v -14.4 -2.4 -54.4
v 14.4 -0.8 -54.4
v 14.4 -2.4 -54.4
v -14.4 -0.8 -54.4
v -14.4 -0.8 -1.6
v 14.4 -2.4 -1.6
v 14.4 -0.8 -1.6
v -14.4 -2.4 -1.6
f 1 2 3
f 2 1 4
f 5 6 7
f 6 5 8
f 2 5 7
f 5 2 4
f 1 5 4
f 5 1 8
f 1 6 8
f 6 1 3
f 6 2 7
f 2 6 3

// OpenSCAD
// file: ../p/4-4edge.scad
use <../lib.scad>
$fa=1; $fs=0.2;
function ldraw_lib__4_4edge(realsolid=false) = [
// 0 Circle 1.0
// 0 Name: 4-4edge.dat
// 0 Author: James Jessiman
// 0 !LDRAW_ORG Primitive UPDATE 2017-01
// 0 !LICENSE Licensed under CC BY 2.0 and CC BY 4.0 : see CAreadme.txt
// 
// 0 BFC CERTIFY CCW
  [0,"BFC","CERTIFY"],
  [0,"BFC","CCW"],
// 
// 0 !HISTORY 1998-12-15 [PTadmin] Official Update 1998-10
// 0 !HISTORY 2005-12-28 [PTadmin] Official Update 2005-01
// 0 !HISTORY 2007-06-24 [PTadmin] Header formatted for Contributor Agreement
// 0 !HISTORY 2008-07-01 [PTadmin] Official Update 2008-01
// 0 !HISTORY 2017-01-15 [Steffen] BFCed
// 0 !HISTORY 2017-12-30 [PTadmin] Official Update 2017-01
// 
// 
// 2 24 1 0 0 0.9239 0 0.3827
  [2,24,1,0,0,0.9239,0,0.3827],
// 2 24 0.9239 0 0.3827 0.7071 0 0.7071
  [2,24,0.9239,0,0.3827,0.7071,0,0.7071],
// 2 24 0.7071 0 0.7071 0.3827 0 0.9239
  [2,24,0.7071,0,0.7071,0.3827,0,0.9239],
// 2 24 0.3827 0 0.9239 0 0 1
  [2,24,0.3827,0,0.9239,0,0,1],
// 2 24 0 0 1 -0.3827 0 0.9239
  [2,24,0,0,1,-0.3827,0,0.9239],
// 2 24 -0.3827 0 0.9239 -0.7071 0 0.7071
  [2,24,-0.3827,0,0.9239,-0.7071,0,0.7071],
// 2 24 -0.7071 0 0.7071 -0.9239 0 0.3827
  [2,24,-0.7071,0,0.7071,-0.9239,0,0.3827],
// 2 24 -0.9239 0 0.3827 -1 0 -0
  [2,24,-0.9239,0,0.3827,-1,0,-0],
// 2 24 -1 0 -0 -0.9239 0 -0.3827
  [2,24,-1,0,-0,-0.9239,0,-0.3827],
// 2 24 -0.9239 0 -0.3827 -0.7071 0 -0.7071
  [2,24,-0.9239,0,-0.3827,-0.7071,0,-0.7071],
// 2 24 -0.7071 0 -0.7071 -0.3827 0 -0.9239
  [2,24,-0.7071,0,-0.7071,-0.3827,0,-0.9239],
// 2 24 -0.3827 0 -0.9239 0 0 -1
  [2,24,-0.3827,0,-0.9239,0,0,-1],
// 2 24 0 0 -1 0.3827 0 -0.9239
  [2,24,0,0,-1,0.3827,0,-0.9239],
// 2 24 0.3827 0 -0.9239 0.7071 0 -0.7071
  [2,24,0.3827,0,-0.9239,0.7071,0,-0.7071],
// 2 24 0.7071 0 -0.7071 0.9239 0 -0.3827
  [2,24,0.7071,0,-0.7071,0.9239,0,-0.3827],
// 2 24 0.9239 0 -0.3827 1 0 0
  [2,24,0.9239,0,-0.3827,1,0,0],
];
module ldraw_lib__4_4edge(step=0, col=false, unit=2/5, alt=false, line=0.2, solid=!$preview)
    makepoly(ldraw_lib__4_4edge(solid), step=step, col=col, unit=unit, alt=alt, line=line, solid=solid);
ldraw_lib__4_4edge(line=0.2);
// file: ../p/4-4disc.scad
use <../lib.scad>
$fa=1; $fs=0.2;
function ldraw_lib__4_4disc(realsolid=false) = [
// 0 Disc 1.0
// 0 Name: 4-4disc.dat
// 0 Author: James Jessiman
// 0 !LDRAW_ORG Primitive UPDATE 2002-02
// 0 !LICENSE Licensed under CC BY 2.0 and CC BY 4.0 : see CAreadme.txt
// 
// 0 BFC CERTIFY CCW
  [0,"BFC","CERTIFY"],
  [0,"BFC","CCW"],
// 
// 0 !HISTORY 1998-12-15 [PTadmin] Official Update 1998-10
// 0 !HISTORY 2002-03-23 [sbliss] Added BFC statement
// 0 !HISTORY 2002-04-25 [PTadmin] Official Update 2002-02
// 0 !HISTORY 2007-06-24 [PTadmin] Header formatted for Contributor Agreement
// 0 !HISTORY 2008-07-01 [PTadmin] Official Update 2008-01
// 
// 
// 3 16 0 0 0 1 0 0 0.9239 0 0.3827
  [3,16,0,0,0,1,0,0,0.9239,0,0.3827],
// 3 16 0 0 0 0.9239 0 0.3827 0.7071 0 0.7071
  [3,16,0,0,0,0.9239,0,0.3827,0.7071,0,0.7071],
// 3 16 0 0 0 0.7071 0 0.7071 0.3827 0 0.9239
  [3,16,0,0,0,0.7071,0,0.7071,0.3827,0,0.9239],
// 3 16 0 0 0 0.3827 0 0.9239 0 0 1
  [3,16,0,0,0,0.3827,0,0.9239,0,0,1],
// 3 16 0 0 0 0 0 1 -0.3827 0 0.9239
  [3,16,0,0,0,0,0,1,-0.3827,0,0.9239],
// 3 16 0 0 0 -0.3827 0 0.9239 -0.7071 0 0.7071
  [3,16,0,0,0,-0.3827,0,0.9239,-0.7071,0,0.7071],
// 3 16 0 0 0 -0.7071 0 0.7071 -0.9239 0 0.3827
  [3,16,0,0,0,-0.7071,0,0.7071,-0.9239,0,0.3827],
// 3 16 0 0 0 -0.9239 0 0.3827 -1 0 -0
  [3,16,0,0,0,-0.9239,0,0.3827,-1,0,-0],
// 3 16 0 0 0 -1 0 -0 -0.9239 0 -0.3827
  [3,16,0,0,0,-1,0,-0,-0.9239,0,-0.3827],
// 3 16 0 0 0 -0.9239 0 -0.3827 -0.7071 0 -0.7071
  [3,16,0,0,0,-0.9239,0,-0.3827,-0.7071,0,-0.7071],
// 3 16 0 0 0 -0.7071 0 -0.7071 -0.3827 0 -0.9239
  [3,16,0,0,0,-0.7071,0,-0.7071,-0.3827,0,-0.9239],
// 3 16 0 0 0 -0.3827 0 -0.9239 0 0 -1
  [3,16,0,0,0,-0.3827,0,-0.9239,0,0,-1],
// 3 16 0 0 0 0 0 -1 0.3827 0 -0.9239
  [3,16,0,0,0,0,0,-1,0.3827,0,-0.9239],
// 3 16 0 0 0 0.3827 0 -0.9239 0.7071 0 -0.7071
  [3,16,0,0,0,0.3827,0,-0.9239,0.7071,0,-0.7071],
// 3 16 0 0 0 0.7071 0 -0.7071 0.9239 0 -0.3827
  [3,16,0,0,0,0.7071,0,-0.7071,0.9239,0,-0.3827],
// 3 16 0 0 0 0.9239 0 -0.3827 1 0 0
  [3,16,0,0,0,0.9239,0,-0.3827,1,0,0],
// 0
];
module ldraw_lib__4_4disc(step=0, col=false, unit=2/5, alt=false, line=0.2, solid=!$preview)
    makepoly(ldraw_lib__4_4disc(solid), step=step, col=col, unit=unit, alt=alt, line=line, solid=solid);
ldraw_lib__4_4disc(line=0.2);
// file: ../p/4-4cyli.scad
use <../lib.scad>
$fa=1; $fs=0.2;
function ldraw_lib__4_4cyli(realsolid=false) = [
// 0 Cylinder 1.0
// 0 Name: 4-4cyli.dat
// 0 Author: James Jessiman
// 0 !LDRAW_ORG Primitive UPDATE 2005-01
// 0 !LICENSE Licensed under CC BY 2.0 and CC BY 4.0 : see CAreadme.txt
// 
// 0 BFC CERTIFY CCW
  [0,"BFC","CERTIFY"],
  [0,"BFC","CCW"],
// 
// 0 !HISTORY 1998-12-15 [PTadmin] Official Update 1998-10
// 0 !HISTORY 2002-03-23 [sbliss] Added BFC statement; merged headers from files in distributions LDraw 0.27 and Complete.
// 0 !HISTORY 2002-04-25 [PTadmin] Official Update 2002-02
// 0 !HISTORY 2004-12-14 [guyvivan] BFC CCW
// 0 !HISTORY 2005-12-28 [PTadmin] Official Update 2005-01
// 0 !HISTORY 2007-06-24 [PTadmin] Header formatted for Contributor Agreement
// 0 !HISTORY 2008-07-01 [PTadmin] Official Update 2008-01
// 
// 
// 4 16 1 1 0 0.9239 1 0.3827 0.9239 0 0.3827 1 0 0
  [4,16,1,1,0,0.9239,1,0.3827,0.9239,0,0.3827,1,0,0],
// 5 24 1 0 0 1 1 0 0.9239 0 0.3827 0.9239 0 -0.3827
  [5,24,1,0,0,1,1,0,0.9239,0,0.3827,0.9239,0,-0.3827],
// 4 16 0.9239 1 0.3827 0.7071 1 0.7071 0.7071 0 0.7071 0.9239 0 0.3827
  [4,16,0.9239,1,0.3827,0.7071,1,0.7071,0.7071,0,0.7071,0.9239,0,0.3827],
// 5 24 0.9239 0 0.3827 0.9239 1 0.3827 0.7071 0 0.7071 1 0 0
  [5,24,0.9239,0,0.3827,0.9239,1,0.3827,0.7071,0,0.7071,1,0,0],
// 4 16 0.7071 1 0.7071 0.3827 1 0.9239 0.3827 0 0.9239 0.7071 0 0.7071
  [4,16,0.7071,1,0.7071,0.3827,1,0.9239,0.3827,0,0.9239,0.7071,0,0.7071],
// 5 24 0.7071 0 0.7071 0.7071 1 0.7071 0.3827 0 0.9239 0.9239 0 0.3827
  [5,24,0.7071,0,0.7071,0.7071,1,0.7071,0.3827,0,0.9239,0.9239,0,0.3827],
// 4 16 0.3827 1 0.9239 0 1 1 0 0 1 0.3827 0 0.9239
  [4,16,0.3827,1,0.9239,0,1,1,0,0,1,0.3827,0,0.9239],
// 5 24 0.3827 0 0.9239 0.3827 1 0.9239 0 0 1 0.7071 0 0.7071
  [5,24,0.3827,0,0.9239,0.3827,1,0.9239,0,0,1,0.7071,0,0.7071],
// 4 16 0 1 1 -0.3827 1 0.9239 -0.3827 0 0.9239 0 0 1
  [4,16,0,1,1,-0.3827,1,0.9239,-0.3827,0,0.9239,0,0,1],
// 5 24 0 0 1 0 1 1 -0.3827 0 0.9239 0.3827 0 0.9239
  [5,24,0,0,1,0,1,1,-0.3827,0,0.9239,0.3827,0,0.9239],
// 4 16 -0.3827 1 0.9239 -0.7071 1 0.7071 -0.7071 0 0.7071 -0.3827 0 0.9239
  [4,16,-0.3827,1,0.9239,-0.7071,1,0.7071,-0.7071,0,0.7071,-0.3827,0,0.9239],
// 5 24 -0.3827 0 0.9239 -0.3827 1 0.9239 -0.7071 0 0.7071 0 0 1
  [5,24,-0.3827,0,0.9239,-0.3827,1,0.9239,-0.7071,0,0.7071,0,0,1],
// 4 16 -0.7071 1 0.7071 -0.9239 1 0.3827 -0.9239 0 0.3827 -0.7071 0 0.7071
  [4,16,-0.7071,1,0.7071,-0.9239,1,0.3827,-0.9239,0,0.3827,-0.7071,0,0.7071],
// 5 24 -0.7071 0 0.7071 -0.7071 1 0.7071 -0.9239 0 0.3827 -0.3827 0 0.9239
  [5,24,-0.7071,0,0.7071,-0.7071,1,0.7071,-0.9239,0,0.3827,-0.3827,0,0.9239],
// 4 16 -0.9239 1 0.3827 -1 1 0 -1 0 0 -0.9239 0 0.3827
  [4,16,-0.9239,1,0.3827,-1,1,0,-1,0,0,-0.9239,0,0.3827],
// 5 24 -0.9239 0 0.3827 -0.9239 1 0.3827 -1 0 0 -0.7071 0 0.7071
  [5,24,-0.9239,0,0.3827,-0.9239,1,0.3827,-1,0,0,-0.7071,0,0.7071],
// 4 16 -1 1 0 -0.9239 1 -0.3827 -0.9239 0 -0.3827 -1 0 0
  [4,16,-1,1,0,-0.9239,1,-0.3827,-0.9239,0,-0.3827,-1,0,0],
// 5 24 -1 0 0 -1 1 0 -0.9239 0 -0.3827 -0.9239 0 0.3827
  [5,24,-1,0,0,-1,1,0,-0.9239,0,-0.3827,-0.9239,0,0.3827],
// 4 16 -0.9239 1 -0.3827 -0.7071 1 -0.7071 -0.7071 0 -0.7071 -0.9239 0 -0.3827
  [4,16,-0.9239,1,-0.3827,-0.7071,1,-0.7071,-0.7071,0,-0.7071,-0.9239,0,-0.3827],
// 5 24 -0.9239 0 -0.3827 -0.9239 1 -0.3827 -0.7071 0 -0.7071 -1 0 0
  [5,24,-0.9239,0,-0.3827,-0.9239,1,-0.3827,-0.7071,0,-0.7071,-1,0,0],
// 4 16 -0.7071 1 -0.7071 -0.3827 1 -0.9239 -0.3827 0 -0.9239 -0.7071 0 -0.7071
  [4,16,-0.7071,1,-0.7071,-0.3827,1,-0.9239,-0.3827,0,-0.9239,-0.7071,0,-0.7071],
// 5 24 -0.7071 0 -0.7071 -0.7071 1 -0.7071 -0.3827 0 -0.9239 -0.9239 0 -0.3827
  [5,24,-0.7071,0,-0.7071,-0.7071,1,-0.7071,-0.3827,0,-0.9239,-0.9239,0,-0.3827],
// 4 16 -0.3827 1 -0.9239 0 1 -1 0 0 -1 -0.3827 0 -0.9239
  [4,16,-0.3827,1,-0.9239,0,1,-1,0,0,-1,-0.3827,0,-0.9239],
// 5 24 -0.3827 0 -0.9239 -0.3827 1 -0.9239 0 0 -1 -0.7071 0 -0.7071
  [5,24,-0.3827,0,-0.9239,-0.3827,1,-0.9239,0,0,-1,-0.7071,0,-0.7071],
// 4 16 0 1 -1 0.3827 1 -0.9239 0.3827 0 -0.9239 0 0 -1
  [4,16,0,1,-1,0.3827,1,-0.9239,0.3827,0,-0.9239,0,0,-1],
// 5 24 0 0 -1 0 1 -1 0.3827 0 -0.9239 -0.3827 0 -0.9239
  [5,24,0,0,-1,0,1,-1,0.3827,0,-0.9239,-0.3827,0,-0.9239],
// 4 16 0.3827 1 -0.9239 0.7071 1 -0.7071 0.7071 0 -0.7071 0.3827 0 -0.9239
  [4,16,0.3827,1,-0.9239,0.7071,1,-0.7071,0.7071,0,-0.7071,0.3827,0,-0.9239],
// 5 24 0.3827 0 -0.9239 0.3827 1 -0.9239 0.7071 0 -0.7071 0 0 -1
  [5,24,0.3827,0,-0.9239,0.3827,1,-0.9239,0.7071,0,-0.7071,0,0,-1],
// 4 16 0.7071 1 -0.7071 0.9239 1 -0.3827 0.9239 0 -0.3827 0.7071 0 -0.7071
  [4,16,0.7071,1,-0.7071,0.9239,1,-0.3827,0.9239,0,-0.3827,0.7071,0,-0.7071],
// 5 24 0.7071 0 -0.7071 0.7071 1 -0.7071 0.9239 0 -0.3827 0.3827 0 -0.9239
  [5,24,0.7071,0,-0.7071,0.7071,1,-0.7071,0.9239,0,-0.3827,0.3827,0,-0.9239],
// 4 16 0.9239 1 -0.3827 1 1 0 1 0 0 0.9239 0 -0.3827
  [4,16,0.9239,1,-0.3827,1,1,0,1,0,0,0.9239,0,-0.3827],
// 5 24 0.9239 0 -0.3827 0.9239 1 -0.3827 1 0 0 0.7071 0 -0.7071
  [5,24,0.9239,0,-0.3827,0.9239,1,-0.3827,1,0,0,0.7071,0,-0.7071],
// 0
];
module ldraw_lib__4_4cyli(step=0, col=false, unit=2/5, alt=false, line=0.2, solid=!$preview)
    makepoly(ldraw_lib__4_4cyli(solid), step=step, col=col, unit=unit, alt=alt, line=line, solid=solid);
ldraw_lib__4_4cyli(line=0.2);
// file: ../p/stud3.scad
use <../lib.scad>
use <4-4cyli.scad>
use <4-4disc.scad>
use <4-4edge.scad>
$fa=1; $fs=0.2;
function ldraw_lib__stud3(realsolid=false) = realsolid ? 
    [openscad(translate([0,0,-eps()], o=cylinder(4+eps(), r=4)),2)] : [
// 0 Stud Tube Solid
// 0 Name: stud3.dat
// 0 Author: James Jessiman
// 0 !LDRAW_ORG Primitive UPDATE 2012-01
// 0 !LICENSE Licensed under CC BY 2.0 and CC BY 4.0 : see CAreadme.txt
// 
// 0 BFC CERTIFY CCW
  [0,"BFC","CERTIFY"],
  [0,"BFC","CCW"],
// 
// 0 !HISTORY 2002-04-04 [sbliss] Modified for BFC compliance
// 0 !HISTORY 2002-04-25 [PTadmin] Official Update 2002-02
// 0 !HISTORY 2007-06-24 [PTadmin] Header formatted for Contributor Agreement
// 0 !HISTORY 2008-07-01 [PTadmin] Official Update 2008-01
// 0 !HISTORY 2012-02-16 [Philo] Changed to CCW
// 0 !HISTORY 2012-03-30 [PTadmin] Official Update 2012-01
// 
// 
// 1 16 0 -4 0 4 0 0 0 1 0 0 0 4 4-4edge.dat
  [1,16,0,-4,0,4,0,0,0,1,0,0,0,4, ldraw_lib__4_4edge(realsolid)],
// 1 16 0 0 0 4 0 0 0 1 0 0 0 4 4-4edge.dat
  [1,16,0,0,0,4,0,0,0,1,0,0,0,4, ldraw_lib__4_4edge(realsolid)],
// 1 16 0 -4 0 4 0 0 0 1 0 0 0 4 4-4disc.dat
  [1,16,0,-4,0,4,0,0,0,1,0,0,0,4, ldraw_lib__4_4disc(realsolid)],
// 1 16 0 -4 0 4 0 0 0 4 0 0 0 4 4-4cyli.dat
  [1,16,0,-4,0,4,0,0,0,4,0,0,0,4, ldraw_lib__4_4cyli(realsolid)],
];
module ldraw_lib__stud3(step=0, col=false, unit=2/5, alt=false, line=0.2, solid=!$preview)
    makepoly(ldraw_lib__stud3(solid), step=step, col=col, unit=unit, alt=alt, line=line, solid=solid);
ldraw_lib__stud3(line=0.2);
// file: ../p/stud.scad
use <../lib.scad>
use <4-4cyli.scad>
use <4-4disc.scad>
use <4-4edge.scad>
$fa=1; $fs=0.2;
function ldraw_lib__stud(realsolid=false) = realsolid ? 
    [openscad(translate([0,0,-eps()], o=cylinder(4+eps(), r=6)),2)] : [
// 0 Stud
// 0 Name: stud.dat
// 0 Author: James Jessiman
// 0 !LDRAW_ORG Primitive UPDATE 2012-01
// 0 !LICENSE Licensed under CC BY 2.0 and CC BY 4.0 : see CAreadme.txt
// 
// 0 BFC CERTIFY CCW
  [0,"BFC","CERTIFY"],
  [0,"BFC","CCW"],
// 
// 0 !HISTORY 2002-04-04 [sbliss] Modified for BFC compliance
// 0 !HISTORY 2002-04-25 [PTadmin] Official Update 2002-02
// 0 !HISTORY 2007-06-24 [PTadmin] Header formatted for Contributor Agreement
// 0 !HISTORY 2008-07-01 [PTadmin] Official Update 2008-01
// 0 !HISTORY 2012-02-16 [Philo] Changed to CCW
// 0 !HISTORY 2012-03-30 [PTadmin] Official Update 2012-01
// 
// 
// 1 16 0 0 0 6 0 0 0 1 0 0 0 6 4-4edge.dat
  [1,16,0,0,0,6,0,0,0,1,0,0,0,6, ldraw_lib__4_4edge(realsolid)],
// 1 16 0 -4 0 6 0 0 0 1 0 0 0 6 4-4edge.dat
  [1,16,0,-4,0,6,0,0,0,1,0,0,0,6, ldraw_lib__4_4edge(realsolid)],
// 1 16 0 0 0 6 0 0 0 -4 0 0 0 6 4-4cyli.dat
  [1,16,0,0,0,6,0,0,0,-4,0,0,0,6, ldraw_lib__4_4cyli(realsolid)],
// 1 16 0 -4 0 6 0 0 0 1 0 0 0 6 4-4disc.dat
  [1,16,0,-4,0,6,0,0,0,1,0,0,0,6, ldraw_lib__4_4disc(realsolid)],
];
module ldraw_lib__stud(step=0, col=false, unit=2/5, alt=false, line=0.2, solid=!$preview)
    makepoly(ldraw_lib__stud(solid), step=step, col=col, unit=unit, alt=alt, line=line, solid=solid);
ldraw_lib__stud(line=0.2);
// file: ../p/box5.scad
use <../lib.scad>
$fa=1; $fs=0.2;
function ldraw_lib__box5(realsolid=false) = [
// 0 Box with 5 Faces and All Edges
// 0 Name: box5.dat
// 0 Author: James Jessiman
// 0 !LDRAW_ORG Primitive UPDATE 2012-01
// 0 !LICENSE Licensed under CC BY 2.0 and CC BY 4.0 : see CAreadme.txt
// 
// 0 BFC CERTIFY CCW
  [0,"BFC","CERTIFY"],
  [0,"BFC","CCW"],
// 
// 0 !HISTORY 2002-04-03 [sbliss] Modified for BFC compliance
// 0 !HISTORY 2002-04-25 [PTadmin] Official Update 2002-02
// 0 !HISTORY 2007-06-24 [PTadmin] Header formatted for Contributor Agreement
// 0 !HISTORY 2008-07-01 [PTadmin] Official Update 2008-01
// 0 !HISTORY 2012-02-16 [Philo] Changed to CCW
// 0 !HISTORY 2012-03-30 [PTadmin] Official Update 2012-01
// 
// 
// 2 24 1 1 1 -1 1 1
  [2,24,1,1,1,-1,1,1],
// 2 24 -1 1 1 -1 1 -1
  [2,24,-1,1,1,-1,1,-1],
// 2 24 -1 1 -1 1 1 -1
  [2,24,-1,1,-1,1,1,-1],
// 2 24 1 1 -1 1 1 1
  [2,24,1,1,-1,1,1,1],
// 2 24 1 0 1 -1 0 1
  [2,24,1,0,1,-1,0,1],
// 2 24 -1 0 1 -1 0 -1
  [2,24,-1,0,1,-1,0,-1],
// 2 24 -1 0 -1 1 0 -1
  [2,24,-1,0,-1,1,0,-1],
// 2 24 1 0 -1 1 0 1
  [2,24,1,0,-1,1,0,1],
// 2 24 1 0 1 1 1 1
  [2,24,1,0,1,1,1,1],
// 2 24 -1 0 1 -1 1 1
  [2,24,-1,0,1,-1,1,1],
// 2 24 1 0 -1 1 1 -1
  [2,24,1,0,-1,1,1,-1],
// 2 24 -1 0 -1 -1 1 -1
  [2,24,-1,0,-1,-1,1,-1],
// 4 16 -1 1 1 1 1 1 1 1 -1 -1 1 -1
  [4,16,-1,1,1,1,1,1,1,1,-1,-1,1,-1],
// 4 16 -1 1 1 -1 0 1 1 0 1 1 1 1
  [4,16,-1,1,1,-1,0,1,1,0,1,1,1,1],
// 4 16 -1 1 -1 -1 0 -1 -1 0 1 -1 1 1
  [4,16,-1,1,-1,-1,0,-1,-1,0,1,-1,1,1],
// 4 16 1 1 -1 1 0 -1 -1 0 -1 -1 1 -1
  [4,16,1,1,-1,1,0,-1,-1,0,-1,-1,1,-1],
// 4 16 1 1 1 1 0 1 1 0 -1 1 1 -1
  [4,16,1,1,1,1,0,1,1,0,-1,1,1,-1],
];
module ldraw_lib__box5(step=0, col=false, unit=2/5, alt=false, line=0.2, solid=!$preview)
    makepoly(ldraw_lib__box5(solid), step=step, col=col, unit=unit, alt=alt, line=line, solid=solid);
ldraw_lib__box5(line=0.2);
// file: ../p/box4t.scad
use <../lib.scad>
$fa=1; $fs=0.2;
function ldraw_lib__box4t(realsolid=false) = [
// 0 Box with 4 Adjacent Faces and All Edges
// 0 Name: box4t.dat
// 0 Author: Tore Eriksson [Tore_Eriksson]
// 0 !LDRAW_ORG Primitive UPDATE 2003-02
// 0 !LICENSE Licensed under CC BY 2.0 and CC BY 4.0 : see CAreadme.txt
// 
// 0 BFC CERTIFY CCW
  [0,"BFC","CERTIFY"],
  [0,"BFC","CCW"],
// 
// 0 !HISTORY 1997-09-29 [PTadmin] Official Update 1997-15
// 0 !HISTORY 2002-08-31 [izanette] Modified with WINDZ for BFC compliance
// 0 !HISTORY 2003-08-01 [PTadmin] Official Update 2003-02
// 0 !HISTORY 2007-06-24 [PTadmin] Header formatted for Contributor Agreement
// 0 !HISTORY 2008-07-01 [PTadmin] Official Update 2008-01
// 
// 
// 2 24 1 1 1 -1 1 1
  [2,24,1,1,1,-1,1,1],
// 2 24 -1 1 1 -1 1 -1
  [2,24,-1,1,1,-1,1,-1],
// 2 24 -1 1 -1 1 1 -1
  [2,24,-1,1,-1,1,1,-1],
// 2 24 1 1 -1 1 1 1
  [2,24,1,1,-1,1,1,1],
// 2 24 1 0 1 -1 0 1
  [2,24,1,0,1,-1,0,1],
// 2 24 -1 0 1 -1 0 -1
  [2,24,-1,0,1,-1,0,-1],
// 2 24 -1 0 -1 1 0 -1
  [2,24,-1,0,-1,1,0,-1],
// 2 24 1 0 -1 1 0 1
  [2,24,1,0,-1,1,0,1],
// 2 24 1 0 1 1 1 1
  [2,24,1,0,1,1,1,1],
// 2 24 -1 0 1 -1 1 1
  [2,24,-1,0,1,-1,1,1],
// 2 24 1 0 -1 1 1 -1
  [2,24,1,0,-1,1,1,-1],
// 2 24 -1 0 -1 -1 1 -1
  [2,24,-1,0,-1,-1,1,-1],
// 4 16 1 1 1 1 1 -1 -1 1 -1 -1 1 1
  [4,16,1,1,1,1,1,-1,-1,1,-1,-1,1,1],
// 4 16 1 1 1 -1 1 1 -1 0 1 1 0 1
  [4,16,1,1,1,-1,1,1,-1,0,1,1,0,1],
// 4 16 -1 1 1 -1 1 -1 -1 0 -1 -1 0 1
  [4,16,-1,1,1,-1,1,-1,-1,0,-1,-1,0,1],
// 0 4 16 -1 1 -1 -1 0 -1 1 0 -1 1 1 -1
// 4 16 1 1 -1 1 1 1 1 0 1 1 0 -1
  [4,16,1,1,-1,1,1,1,1,0,1,1,0,-1],
// 0
];
module ldraw_lib__box4t(step=0, col=false, unit=2/5, alt=false, line=0.2, solid=!$preview)
    makepoly(ldraw_lib__box4t(solid), step=step, col=col, unit=unit, alt=alt, line=line, solid=solid);
ldraw_lib__box4t(line=0.2);
// file: s/3004s01.scad
use <../../lib.scad>
use <../../p/box4t.scad>
use <../../p/box5.scad>
use <../../p/stud.scad>
use <../../p/stud3.scad>
$fa=1; $fs=0.2;
function ldraw_lib__s__3004s01(realsolid=false) = [
// 0 ~Brick  1 x  2 without Front Face
// 0 Name: s\3004s01.dat
// 0 Author: James Jessiman
// 0 !LDRAW_ORG Subpart UPDATE 2003-03
// 0 !LICENSE Licensed under CC BY 2.0 and CC BY 4.0 : see CAreadme.txt
// 
// 0 BFC CERTIFY CCW
  [0,"BFC","CERTIFY"],
  [0,"BFC","CCW"],
// 
// 0 !HISTORY 2003-09-07 [jriley] Subfiling, BFC
// 0 !HISTORY 2003-12-19 [PTadmin] Official Update 2003-03
// 0 !HISTORY 2007-08-29 [PTadmin] Header formatted for Contributor Agreement
// 0 !HISTORY 2008-07-01 [PTadmin] Official Update 2008-01
// 
// 
// 1 16 0 4 0 1 0 0 0 -5 0 0 0 1 stud3.dat
  [1,16,0,4,0,1,0,0,0,-5,0,0,0,1, ldraw_lib__stud3(realsolid)],
// 0 BFC INVERTNEXT
  [0,"BFC","INVERTNEXT"],
// 1 16 0 24 0 16 0 0 0 -20 0 0 0 6 box5.dat
  [1,16,0,24,0,16,0,0,0,-20,0,0,0,6, ldraw_lib__box5(realsolid)],
// 4 16 20 24 10 16 24 6 -16 24 6 -20 24 10
  [4,16,20,24,10,16,24,6,-16,24,6,-20,24,10],
// 4 16 -20 24 10 -16 24 6 -16 24 -6 -20 24 -10
  [4,16,-20,24,10,-16,24,6,-16,24,-6,-20,24,-10],
// 4 16 -20 24 -10 -16 24 -6 16 24 -6 20 24 -10
  [4,16,-20,24,-10,-16,24,-6,16,24,-6,20,24,-10],
// 4 16 20 24 -10 16 24 -6 16 24 6 20 24 10
  [4,16,20,24,-10,16,24,-6,16,24,6,20,24,10],
// 1 16 0 24 0 20 0 0 0 -24 0 0 0 10 box4t.dat
  [1,16,0,24,0,20,0,0,0,-24,0,0,0,10, ldraw_lib__box4t(realsolid)],
// 1 16 10 0 0 1 0 0 0 1 0 0 0 1 stud.dat
  [1,16,10,0,0,1,0,0,0,1,0,0,0,1, ldraw_lib__stud(realsolid)],
// 1 16 -10 0 0 1 0 0 0 1 0 0 0 1 stud.dat
  [1,16,-10,0,0,1,0,0,0,1,0,0,0,1, ldraw_lib__stud(realsolid)],
// 0
];
module ldraw_lib__s__3004s01(step=0, col=false, unit=2/5, alt=false, line=0.2, solid=!$preview)
    makepoly(ldraw_lib__s__3004s01(solid), step=step, col=col, unit=unit, alt=alt, line=line, solid=solid);
ldraw_lib__s__3004s01(line=0.2);
// file: ../p/box.scad
use <../lib.scad>
$fa=1; $fs=0.2;
function ldraw_lib__box(realsolid=false) = [
// 0 Box 6 (six faces)
// 0 Name: box.dat
// 0 Author: James Jessiman
// 0 !LDRAW_ORG Primitive UPDATE 2002-05
// 0 !LICENSE Licensed under CC BY 2.0 and CC BY 4.0 : see CAreadme.txt
// 
// 0 BFC CERTIFY CCW
  [0,"BFC","CERTIFY"],
  [0,"BFC","CCW"],
// 
// 0 !HISTORY 2002-08-22 [sbliss] Applied BFC
// 0 !HISTORY 2002-11-30 [PTadmin] Official Update 2002-05
// 0 !HISTORY 2007-06-24 [PTadmin] Header formatted for Contributor Agreement
// 0 !HISTORY 2008-07-01 [PTadmin] Official Update 2008-01
// 
// 
// 2 24 1 1 1 -1 1 1
  [2,24,1,1,1,-1,1,1],
// 2 24 -1 1 1 -1 1 -1
  [2,24,-1,1,1,-1,1,-1],
// 2 24 -1 1 -1 1 1 -1
  [2,24,-1,1,-1,1,1,-1],
// 2 24 1 1 -1 1 1 1
  [2,24,1,1,-1,1,1,1],
// 2 24 1 -1 1 -1 -1 1
  [2,24,1,-1,1,-1,-1,1],
// 2 24 -1 -1 1 -1 -1 -1
  [2,24,-1,-1,1,-1,-1,-1],
// 2 24 -1 -1 -1 1 -1 -1
  [2,24,-1,-1,-1,1,-1,-1],
// 2 24 1 -1 -1 1 -1 1
  [2,24,1,-1,-1,1,-1,1],
// 2 24 1 -1 1 1 1 1
  [2,24,1,-1,1,1,1,1],
// 2 24 -1 -1 1 -1 1 1
  [2,24,-1,-1,1,-1,1,1],
// 2 24 1 -1 -1 1 1 -1
  [2,24,1,-1,-1,1,1,-1],
// 2 24 -1 -1 -1 -1 1 -1
  [2,24,-1,-1,-1,-1,1,-1],
// 4 16 1 1 1 1 1 -1 -1 1 -1 -1 1 1
  [4,16,1,1,1,1,1,-1,-1,1,-1,-1,1,1],
// 4 16 -1 -1 -1 1 -1 -1 1 -1 1 -1 -1 1
  [4,16,-1,-1,-1,1,-1,-1,1,-1,1,-1,-1,1],
// 4 16 -1 -1 1 1 -1 1 1 1 1 -1 1 1
  [4,16,-1,-1,1,1,-1,1,1,1,1,-1,1,1],
// 4 16 -1 -1 -1 -1 -1 1 -1 1 1 -1 1 -1
  [4,16,-1,-1,-1,-1,-1,1,-1,1,1,-1,1,-1],
// 4 16 1 -1 -1 -1 -1 -1 -1 1 -1 1 1 -1
  [4,16,1,-1,-1,-1,-1,-1,-1,1,-1,1,1,-1],
// 4 16 1 -1 1 1 -1 -1 1 1 -1 1 1 1
  [4,16,1,-1,1,1,-1,-1,1,1,-1,1,1,1],
// 0
];
module ldraw_lib__box(step=0, col=false, unit=2/5, alt=false, line=0.2, solid=!$preview)
    makepoly(ldraw_lib__box(solid), step=step, col=col, unit=unit, alt=alt, line=line, solid=solid);
ldraw_lib__box(line=0.2);
// file: 3004.scad
use <../lib.scad>
use <s/3004s01.scad>
$fa=1; $fs=0.2;
function ldraw_lib__3004(realsolid=false) = [
// 0 Brick  1 x  2
// 0 Name: 3004.dat
// 0 Author: James Jessiman
// 0 !LDRAW_ORG Part UPDATE 2022-05
// 0 !LICENSE Licensed under CC BY 2.0 and CC BY 4.0 : see CAreadme.txt
// 
// 0 BFC CERTIFY CCW
  [0,"BFC","CERTIFY"],
  [0,"BFC","CCW"],
// 
// 0 !HISTORY 2001-10-26 [PTadmin] Official Update 2001-01
// 0 !HISTORY 2002-05-07 {unknown} BFC Certification
// 0 !HISTORY 2002-06-11 [PTadmin] Official Update 2002-03
// 0 !HISTORY 2007-05-07 [PTadmin] Header formatted for Contributor Agreement
// 0 !HISTORY 2008-07-01 [PTadmin] Official Update 2008-01
// 0 !HISTORY 2022-08-04 [MagFors] Using subfile
// 0 !HISTORY 2022-09-15 [PTadmin] Official Update 2022-05
// 
// 
// 1 16 0 0 0 1 0 0 0 1 0 0 0 1 s\3004s01.dat
  [1,16,0,0,0,1,0,0,0,1,0,0,0,1, ldraw_lib__s__3004s01(realsolid)],
// 4 16 -20 24 -10 20 24 -10 20 0 -10 -20 0 -10
  [4,16,-20,24,-10,20,24,-10,20,0,-10,-20,0,-10],
];
module ldraw_lib__3004(step=0, col=false, unit=2/5, alt=false, line=0.2, solid=!$preview)
    makepoly(ldraw_lib__3004(solid), step=step, col=col, unit=unit, alt=alt, line=line, solid=solid);
ldraw_lib__3004(line=0.2);
// file: 6202.scad
use <../lib.scad>
use <../p/box.scad>
$fa=1; $fs=0.2;
function ldraw_lib__6202(realsolid=false) = [
// 0 ~Glass for Window  1 x  4 x  6
// 0 Name: 6202.dat
// 0 Author: James Jessiman
// 0 !LDRAW_ORG Part UPDATE 2012-03
// 0 !LICENSE Licensed under CC BY 2.0 and CC BY 4.0 : see CAreadme.txt
// 
// 0 BFC CERTIFY CCW
  [0,"BFC","CERTIFY"],
  [0,"BFC","CCW"],
// 
// 0 !HISTORY 1999-02-01 [PTadmin] Official Update 1999-01
// 0 !HISTORY 2007-07-16 [PTadmin] Header formatted for Contributor Agreement
// 0 !HISTORY 2008-07-01 [PTadmin] Official Update 2008-01
// 0 !HISTORY 2009-04-28 [PTadmin] Renamed from 6160b
// 0 !HISTORY 2012-11-14 [mikeheide] BFC'ed
// 0 !HISTORY 2012-12-28 [PTadmin] Official Update 2012-03
// 
// 
// 1 16 0 70 -4 36 0 0 0 66 0 0 0 2 box.dat
  [1,16,0,70,-4,36,0,0,0,66,0,0,0,2, ldraw_lib__box(realsolid)],
];
module ldraw_lib__6202(step=0, col=false, unit=2/5, alt=false, line=0.2, solid=!$preview)
    makepoly(ldraw_lib__6202(solid), step=step, col=col, unit=unit, alt=alt, line=line, solid=solid);
ldraw_lib__6202(line=0.2);
// main file
use <../lib.scad>
use <6202.scad>
$fa=1; $fs=0.2;
function ldraw_lib__6160b(realsolid=false) = [
// 0 ~Moved to 6202
// 0 Name: 6160b.dat
// 0 Author: [PTadmin]
// 0 !LDRAW_ORG Part UPDATE 2012-03
// 0 !LICENSE Licensed under CC BY 4.0 : see CAreadme.txt
// 
// 0 BFC CERTIFY CCW
  [0,"BFC","CERTIFY"],
  [0,"BFC","CCW"],
// 
// 0 !HISTORY 2012-12-28 [PTadmin] Official Update 2012-03
// 
// 
// 0 // ~Glass for Window 1 x 4 x 6
// 1 16 0 0 0 1 0 0 0 1 0 0 0 1 6202.dat
  [1,16,0,0,0,1,0,0,0,1,0,0,0,1, ldraw_lib__6202(realsolid)],
];
module ldraw_lib__6160b(step=0, col=false, unit=2/5, alt=false, line=0.2, solid=!$preview)
    makepoly(ldraw_lib__6160b(solid), step=step, col=col, unit=unit, alt=alt, line=line, solid=solid);
ldraw_lib__6160b(line=0.2);
